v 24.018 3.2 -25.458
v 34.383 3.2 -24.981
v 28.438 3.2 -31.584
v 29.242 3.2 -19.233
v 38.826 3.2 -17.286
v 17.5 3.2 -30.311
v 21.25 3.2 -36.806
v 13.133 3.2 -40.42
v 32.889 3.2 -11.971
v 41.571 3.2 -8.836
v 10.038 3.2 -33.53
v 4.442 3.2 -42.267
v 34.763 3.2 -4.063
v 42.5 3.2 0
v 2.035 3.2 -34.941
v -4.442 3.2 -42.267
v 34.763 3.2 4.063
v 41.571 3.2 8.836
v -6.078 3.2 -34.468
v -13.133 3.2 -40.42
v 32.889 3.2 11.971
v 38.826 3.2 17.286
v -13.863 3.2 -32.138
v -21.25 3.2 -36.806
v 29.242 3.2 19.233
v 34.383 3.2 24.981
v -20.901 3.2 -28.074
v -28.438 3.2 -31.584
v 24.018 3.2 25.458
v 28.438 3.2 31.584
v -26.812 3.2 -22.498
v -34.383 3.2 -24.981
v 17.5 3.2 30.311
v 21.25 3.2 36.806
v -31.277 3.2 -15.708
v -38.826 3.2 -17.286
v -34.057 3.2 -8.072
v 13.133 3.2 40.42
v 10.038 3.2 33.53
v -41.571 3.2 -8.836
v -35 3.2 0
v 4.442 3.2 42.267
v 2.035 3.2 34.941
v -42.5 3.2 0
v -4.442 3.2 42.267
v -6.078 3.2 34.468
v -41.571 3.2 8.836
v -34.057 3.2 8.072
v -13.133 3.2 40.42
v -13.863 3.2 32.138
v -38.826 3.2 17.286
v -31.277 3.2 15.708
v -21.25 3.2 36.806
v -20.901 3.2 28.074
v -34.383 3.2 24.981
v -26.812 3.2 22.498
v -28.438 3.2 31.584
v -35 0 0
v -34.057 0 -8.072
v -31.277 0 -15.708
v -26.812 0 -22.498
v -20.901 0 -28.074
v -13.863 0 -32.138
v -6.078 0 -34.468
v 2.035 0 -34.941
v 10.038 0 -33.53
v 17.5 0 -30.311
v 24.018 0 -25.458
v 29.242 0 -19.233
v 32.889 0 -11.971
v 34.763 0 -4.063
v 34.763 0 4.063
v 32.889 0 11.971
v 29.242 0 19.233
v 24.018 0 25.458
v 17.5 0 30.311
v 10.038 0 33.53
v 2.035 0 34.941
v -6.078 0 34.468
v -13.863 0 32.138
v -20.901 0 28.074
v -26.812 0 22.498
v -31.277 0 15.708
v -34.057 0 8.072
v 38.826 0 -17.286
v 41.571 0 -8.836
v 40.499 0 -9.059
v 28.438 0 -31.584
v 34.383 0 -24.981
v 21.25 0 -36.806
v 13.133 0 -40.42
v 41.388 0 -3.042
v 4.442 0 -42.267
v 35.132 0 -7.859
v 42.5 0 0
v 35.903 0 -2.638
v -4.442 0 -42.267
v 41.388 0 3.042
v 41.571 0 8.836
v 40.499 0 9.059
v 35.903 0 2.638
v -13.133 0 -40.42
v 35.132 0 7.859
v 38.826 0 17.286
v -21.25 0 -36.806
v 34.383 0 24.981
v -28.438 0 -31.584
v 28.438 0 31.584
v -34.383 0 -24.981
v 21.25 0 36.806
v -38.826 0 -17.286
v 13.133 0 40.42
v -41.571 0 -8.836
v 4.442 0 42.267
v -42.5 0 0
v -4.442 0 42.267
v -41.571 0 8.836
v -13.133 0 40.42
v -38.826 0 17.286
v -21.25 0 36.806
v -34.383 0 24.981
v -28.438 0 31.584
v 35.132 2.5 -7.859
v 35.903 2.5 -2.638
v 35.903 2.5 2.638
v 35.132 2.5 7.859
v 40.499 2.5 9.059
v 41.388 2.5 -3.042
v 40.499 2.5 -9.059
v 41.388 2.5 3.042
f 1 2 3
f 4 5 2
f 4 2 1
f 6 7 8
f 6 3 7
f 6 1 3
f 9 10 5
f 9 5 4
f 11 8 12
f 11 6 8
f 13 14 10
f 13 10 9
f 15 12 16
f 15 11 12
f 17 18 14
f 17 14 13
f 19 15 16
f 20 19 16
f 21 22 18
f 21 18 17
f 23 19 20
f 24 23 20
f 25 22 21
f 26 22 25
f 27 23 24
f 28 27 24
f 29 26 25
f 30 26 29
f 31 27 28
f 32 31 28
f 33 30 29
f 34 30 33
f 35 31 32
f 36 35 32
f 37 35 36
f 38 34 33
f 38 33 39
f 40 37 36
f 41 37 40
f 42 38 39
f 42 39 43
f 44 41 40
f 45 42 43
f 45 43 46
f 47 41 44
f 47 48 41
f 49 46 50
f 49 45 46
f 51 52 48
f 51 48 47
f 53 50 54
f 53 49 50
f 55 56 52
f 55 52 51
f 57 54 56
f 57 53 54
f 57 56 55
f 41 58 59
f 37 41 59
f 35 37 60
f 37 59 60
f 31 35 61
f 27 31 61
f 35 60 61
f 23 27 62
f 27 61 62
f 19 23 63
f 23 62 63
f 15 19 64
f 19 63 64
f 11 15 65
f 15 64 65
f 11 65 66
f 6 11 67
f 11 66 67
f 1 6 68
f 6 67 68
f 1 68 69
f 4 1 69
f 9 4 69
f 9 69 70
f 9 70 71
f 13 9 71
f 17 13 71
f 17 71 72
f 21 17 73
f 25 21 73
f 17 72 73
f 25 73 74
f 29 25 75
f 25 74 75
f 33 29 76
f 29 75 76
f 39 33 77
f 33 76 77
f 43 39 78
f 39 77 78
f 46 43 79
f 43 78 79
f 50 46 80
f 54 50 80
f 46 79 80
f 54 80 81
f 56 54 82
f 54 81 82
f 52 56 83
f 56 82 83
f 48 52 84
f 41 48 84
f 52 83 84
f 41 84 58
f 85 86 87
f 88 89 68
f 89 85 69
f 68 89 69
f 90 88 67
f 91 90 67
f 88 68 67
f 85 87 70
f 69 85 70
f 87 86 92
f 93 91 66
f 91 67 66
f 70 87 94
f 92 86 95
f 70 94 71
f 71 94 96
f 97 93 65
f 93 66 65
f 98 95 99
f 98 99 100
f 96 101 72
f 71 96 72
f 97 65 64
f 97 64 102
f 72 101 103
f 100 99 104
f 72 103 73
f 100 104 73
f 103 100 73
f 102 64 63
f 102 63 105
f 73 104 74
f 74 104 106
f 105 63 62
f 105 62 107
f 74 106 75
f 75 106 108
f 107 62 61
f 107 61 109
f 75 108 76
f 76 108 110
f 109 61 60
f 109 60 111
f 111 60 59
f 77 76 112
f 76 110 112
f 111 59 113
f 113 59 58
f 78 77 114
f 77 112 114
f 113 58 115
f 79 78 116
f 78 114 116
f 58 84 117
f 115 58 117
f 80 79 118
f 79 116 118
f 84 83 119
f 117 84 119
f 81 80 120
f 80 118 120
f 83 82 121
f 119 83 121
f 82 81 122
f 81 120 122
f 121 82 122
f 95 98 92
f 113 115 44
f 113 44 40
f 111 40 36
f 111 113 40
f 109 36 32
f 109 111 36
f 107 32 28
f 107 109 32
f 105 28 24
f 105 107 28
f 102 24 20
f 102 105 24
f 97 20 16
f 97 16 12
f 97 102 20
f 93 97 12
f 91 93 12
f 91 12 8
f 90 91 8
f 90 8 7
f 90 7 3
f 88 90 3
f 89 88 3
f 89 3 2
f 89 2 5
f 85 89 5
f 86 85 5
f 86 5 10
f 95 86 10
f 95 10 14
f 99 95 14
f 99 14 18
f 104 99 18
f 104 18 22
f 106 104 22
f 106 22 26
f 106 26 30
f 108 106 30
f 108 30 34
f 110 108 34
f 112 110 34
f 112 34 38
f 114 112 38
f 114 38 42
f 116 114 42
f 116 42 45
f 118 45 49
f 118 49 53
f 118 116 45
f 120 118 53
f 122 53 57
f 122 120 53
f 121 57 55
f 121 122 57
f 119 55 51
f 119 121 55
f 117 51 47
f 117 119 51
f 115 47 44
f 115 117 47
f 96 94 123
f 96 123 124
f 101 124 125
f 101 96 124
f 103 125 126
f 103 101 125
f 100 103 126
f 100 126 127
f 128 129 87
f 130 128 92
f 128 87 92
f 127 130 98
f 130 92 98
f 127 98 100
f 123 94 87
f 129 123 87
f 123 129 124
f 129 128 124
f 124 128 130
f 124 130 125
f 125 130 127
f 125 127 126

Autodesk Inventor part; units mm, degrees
ref_plane "YZ Plane" through (0, 0, 0) normal (1, 0, 0) x (0, 1, 0)
ref_plane "XZ Plane" through (0, 0, 0) normal (0, 1, 0) x (-1, 0, 0)
ref_plane "XY Plane" through (0, 0, 0) normal (0, 0, 1) x (1, 0, 0)
sketch "Sketch1" plane through (0, 0, 0) normal (0, 1, 0) x (-1, 0, 0)
  circle A0 centre (0, 0) radius 42.5
  circle A1 centre (0, 0) radius 35
  line L0 (0, 0) -> (-41.3068, 10)
  line L1 (0, 0) -> (-41.3068, -10)
  line L2 (0, 0) -> (-42.5, 0)
  line L3 (-28.5133, 6.9028) -> (-28.5133, -6.9028)
  arc A2 (-34.9893, 8.4706) -> (-34.9893, -8.4706) centre (0, 0) ccw
  arc A3 (-40.3349, 9.7647) -> (-40.3349, -9.7647) centre (0, 0) ccw
  line L4 (0, 0) -> (-41.475, 9.2776)
  line L5 (0, 0) -> (-41.475, -9.2776)
  point P0 (-28.5133, 0)
  point P1 (-40.4991, -9.0593)
  point P2 (-35.1318, -7.8587)
  point P3 (-35.1318, 7.8587)
  point P4 (-40.4991, 9.0593)
  dimension "d0" = 85
  dimension "d1" = 70
  dimension "d2" = 20
  dimension "d4" = 1
  dimension "d5" = 1
  dimension "d6" = 1
  dimension "d7" = 1
extrude "Extrusion1" add sketch "Sketch1" along normal blind 3.2 contours A0 L1 A1 L0 | L0 A3 L4 A0 | A0 L5 A3 L1 | L4 A3 L2 A0 | L0 A2 L4 A3 | A0 L2 A3 L5 | A3 L5 A2 L1 | L4 A2 L2 A3 | L0 A1 L4 A2 | A3 L2 A2 L5 | A2 L5 A1 L1 | L4 A1 L2 A2 | A2 L2 A1 L5
extrude "Extrusion2" cut sketch "Sketch1" along normal blind 2.5 contours L4 A2 L2 A3 | A3 L2 A2 L5
properties part number "NeoPixel-24"
